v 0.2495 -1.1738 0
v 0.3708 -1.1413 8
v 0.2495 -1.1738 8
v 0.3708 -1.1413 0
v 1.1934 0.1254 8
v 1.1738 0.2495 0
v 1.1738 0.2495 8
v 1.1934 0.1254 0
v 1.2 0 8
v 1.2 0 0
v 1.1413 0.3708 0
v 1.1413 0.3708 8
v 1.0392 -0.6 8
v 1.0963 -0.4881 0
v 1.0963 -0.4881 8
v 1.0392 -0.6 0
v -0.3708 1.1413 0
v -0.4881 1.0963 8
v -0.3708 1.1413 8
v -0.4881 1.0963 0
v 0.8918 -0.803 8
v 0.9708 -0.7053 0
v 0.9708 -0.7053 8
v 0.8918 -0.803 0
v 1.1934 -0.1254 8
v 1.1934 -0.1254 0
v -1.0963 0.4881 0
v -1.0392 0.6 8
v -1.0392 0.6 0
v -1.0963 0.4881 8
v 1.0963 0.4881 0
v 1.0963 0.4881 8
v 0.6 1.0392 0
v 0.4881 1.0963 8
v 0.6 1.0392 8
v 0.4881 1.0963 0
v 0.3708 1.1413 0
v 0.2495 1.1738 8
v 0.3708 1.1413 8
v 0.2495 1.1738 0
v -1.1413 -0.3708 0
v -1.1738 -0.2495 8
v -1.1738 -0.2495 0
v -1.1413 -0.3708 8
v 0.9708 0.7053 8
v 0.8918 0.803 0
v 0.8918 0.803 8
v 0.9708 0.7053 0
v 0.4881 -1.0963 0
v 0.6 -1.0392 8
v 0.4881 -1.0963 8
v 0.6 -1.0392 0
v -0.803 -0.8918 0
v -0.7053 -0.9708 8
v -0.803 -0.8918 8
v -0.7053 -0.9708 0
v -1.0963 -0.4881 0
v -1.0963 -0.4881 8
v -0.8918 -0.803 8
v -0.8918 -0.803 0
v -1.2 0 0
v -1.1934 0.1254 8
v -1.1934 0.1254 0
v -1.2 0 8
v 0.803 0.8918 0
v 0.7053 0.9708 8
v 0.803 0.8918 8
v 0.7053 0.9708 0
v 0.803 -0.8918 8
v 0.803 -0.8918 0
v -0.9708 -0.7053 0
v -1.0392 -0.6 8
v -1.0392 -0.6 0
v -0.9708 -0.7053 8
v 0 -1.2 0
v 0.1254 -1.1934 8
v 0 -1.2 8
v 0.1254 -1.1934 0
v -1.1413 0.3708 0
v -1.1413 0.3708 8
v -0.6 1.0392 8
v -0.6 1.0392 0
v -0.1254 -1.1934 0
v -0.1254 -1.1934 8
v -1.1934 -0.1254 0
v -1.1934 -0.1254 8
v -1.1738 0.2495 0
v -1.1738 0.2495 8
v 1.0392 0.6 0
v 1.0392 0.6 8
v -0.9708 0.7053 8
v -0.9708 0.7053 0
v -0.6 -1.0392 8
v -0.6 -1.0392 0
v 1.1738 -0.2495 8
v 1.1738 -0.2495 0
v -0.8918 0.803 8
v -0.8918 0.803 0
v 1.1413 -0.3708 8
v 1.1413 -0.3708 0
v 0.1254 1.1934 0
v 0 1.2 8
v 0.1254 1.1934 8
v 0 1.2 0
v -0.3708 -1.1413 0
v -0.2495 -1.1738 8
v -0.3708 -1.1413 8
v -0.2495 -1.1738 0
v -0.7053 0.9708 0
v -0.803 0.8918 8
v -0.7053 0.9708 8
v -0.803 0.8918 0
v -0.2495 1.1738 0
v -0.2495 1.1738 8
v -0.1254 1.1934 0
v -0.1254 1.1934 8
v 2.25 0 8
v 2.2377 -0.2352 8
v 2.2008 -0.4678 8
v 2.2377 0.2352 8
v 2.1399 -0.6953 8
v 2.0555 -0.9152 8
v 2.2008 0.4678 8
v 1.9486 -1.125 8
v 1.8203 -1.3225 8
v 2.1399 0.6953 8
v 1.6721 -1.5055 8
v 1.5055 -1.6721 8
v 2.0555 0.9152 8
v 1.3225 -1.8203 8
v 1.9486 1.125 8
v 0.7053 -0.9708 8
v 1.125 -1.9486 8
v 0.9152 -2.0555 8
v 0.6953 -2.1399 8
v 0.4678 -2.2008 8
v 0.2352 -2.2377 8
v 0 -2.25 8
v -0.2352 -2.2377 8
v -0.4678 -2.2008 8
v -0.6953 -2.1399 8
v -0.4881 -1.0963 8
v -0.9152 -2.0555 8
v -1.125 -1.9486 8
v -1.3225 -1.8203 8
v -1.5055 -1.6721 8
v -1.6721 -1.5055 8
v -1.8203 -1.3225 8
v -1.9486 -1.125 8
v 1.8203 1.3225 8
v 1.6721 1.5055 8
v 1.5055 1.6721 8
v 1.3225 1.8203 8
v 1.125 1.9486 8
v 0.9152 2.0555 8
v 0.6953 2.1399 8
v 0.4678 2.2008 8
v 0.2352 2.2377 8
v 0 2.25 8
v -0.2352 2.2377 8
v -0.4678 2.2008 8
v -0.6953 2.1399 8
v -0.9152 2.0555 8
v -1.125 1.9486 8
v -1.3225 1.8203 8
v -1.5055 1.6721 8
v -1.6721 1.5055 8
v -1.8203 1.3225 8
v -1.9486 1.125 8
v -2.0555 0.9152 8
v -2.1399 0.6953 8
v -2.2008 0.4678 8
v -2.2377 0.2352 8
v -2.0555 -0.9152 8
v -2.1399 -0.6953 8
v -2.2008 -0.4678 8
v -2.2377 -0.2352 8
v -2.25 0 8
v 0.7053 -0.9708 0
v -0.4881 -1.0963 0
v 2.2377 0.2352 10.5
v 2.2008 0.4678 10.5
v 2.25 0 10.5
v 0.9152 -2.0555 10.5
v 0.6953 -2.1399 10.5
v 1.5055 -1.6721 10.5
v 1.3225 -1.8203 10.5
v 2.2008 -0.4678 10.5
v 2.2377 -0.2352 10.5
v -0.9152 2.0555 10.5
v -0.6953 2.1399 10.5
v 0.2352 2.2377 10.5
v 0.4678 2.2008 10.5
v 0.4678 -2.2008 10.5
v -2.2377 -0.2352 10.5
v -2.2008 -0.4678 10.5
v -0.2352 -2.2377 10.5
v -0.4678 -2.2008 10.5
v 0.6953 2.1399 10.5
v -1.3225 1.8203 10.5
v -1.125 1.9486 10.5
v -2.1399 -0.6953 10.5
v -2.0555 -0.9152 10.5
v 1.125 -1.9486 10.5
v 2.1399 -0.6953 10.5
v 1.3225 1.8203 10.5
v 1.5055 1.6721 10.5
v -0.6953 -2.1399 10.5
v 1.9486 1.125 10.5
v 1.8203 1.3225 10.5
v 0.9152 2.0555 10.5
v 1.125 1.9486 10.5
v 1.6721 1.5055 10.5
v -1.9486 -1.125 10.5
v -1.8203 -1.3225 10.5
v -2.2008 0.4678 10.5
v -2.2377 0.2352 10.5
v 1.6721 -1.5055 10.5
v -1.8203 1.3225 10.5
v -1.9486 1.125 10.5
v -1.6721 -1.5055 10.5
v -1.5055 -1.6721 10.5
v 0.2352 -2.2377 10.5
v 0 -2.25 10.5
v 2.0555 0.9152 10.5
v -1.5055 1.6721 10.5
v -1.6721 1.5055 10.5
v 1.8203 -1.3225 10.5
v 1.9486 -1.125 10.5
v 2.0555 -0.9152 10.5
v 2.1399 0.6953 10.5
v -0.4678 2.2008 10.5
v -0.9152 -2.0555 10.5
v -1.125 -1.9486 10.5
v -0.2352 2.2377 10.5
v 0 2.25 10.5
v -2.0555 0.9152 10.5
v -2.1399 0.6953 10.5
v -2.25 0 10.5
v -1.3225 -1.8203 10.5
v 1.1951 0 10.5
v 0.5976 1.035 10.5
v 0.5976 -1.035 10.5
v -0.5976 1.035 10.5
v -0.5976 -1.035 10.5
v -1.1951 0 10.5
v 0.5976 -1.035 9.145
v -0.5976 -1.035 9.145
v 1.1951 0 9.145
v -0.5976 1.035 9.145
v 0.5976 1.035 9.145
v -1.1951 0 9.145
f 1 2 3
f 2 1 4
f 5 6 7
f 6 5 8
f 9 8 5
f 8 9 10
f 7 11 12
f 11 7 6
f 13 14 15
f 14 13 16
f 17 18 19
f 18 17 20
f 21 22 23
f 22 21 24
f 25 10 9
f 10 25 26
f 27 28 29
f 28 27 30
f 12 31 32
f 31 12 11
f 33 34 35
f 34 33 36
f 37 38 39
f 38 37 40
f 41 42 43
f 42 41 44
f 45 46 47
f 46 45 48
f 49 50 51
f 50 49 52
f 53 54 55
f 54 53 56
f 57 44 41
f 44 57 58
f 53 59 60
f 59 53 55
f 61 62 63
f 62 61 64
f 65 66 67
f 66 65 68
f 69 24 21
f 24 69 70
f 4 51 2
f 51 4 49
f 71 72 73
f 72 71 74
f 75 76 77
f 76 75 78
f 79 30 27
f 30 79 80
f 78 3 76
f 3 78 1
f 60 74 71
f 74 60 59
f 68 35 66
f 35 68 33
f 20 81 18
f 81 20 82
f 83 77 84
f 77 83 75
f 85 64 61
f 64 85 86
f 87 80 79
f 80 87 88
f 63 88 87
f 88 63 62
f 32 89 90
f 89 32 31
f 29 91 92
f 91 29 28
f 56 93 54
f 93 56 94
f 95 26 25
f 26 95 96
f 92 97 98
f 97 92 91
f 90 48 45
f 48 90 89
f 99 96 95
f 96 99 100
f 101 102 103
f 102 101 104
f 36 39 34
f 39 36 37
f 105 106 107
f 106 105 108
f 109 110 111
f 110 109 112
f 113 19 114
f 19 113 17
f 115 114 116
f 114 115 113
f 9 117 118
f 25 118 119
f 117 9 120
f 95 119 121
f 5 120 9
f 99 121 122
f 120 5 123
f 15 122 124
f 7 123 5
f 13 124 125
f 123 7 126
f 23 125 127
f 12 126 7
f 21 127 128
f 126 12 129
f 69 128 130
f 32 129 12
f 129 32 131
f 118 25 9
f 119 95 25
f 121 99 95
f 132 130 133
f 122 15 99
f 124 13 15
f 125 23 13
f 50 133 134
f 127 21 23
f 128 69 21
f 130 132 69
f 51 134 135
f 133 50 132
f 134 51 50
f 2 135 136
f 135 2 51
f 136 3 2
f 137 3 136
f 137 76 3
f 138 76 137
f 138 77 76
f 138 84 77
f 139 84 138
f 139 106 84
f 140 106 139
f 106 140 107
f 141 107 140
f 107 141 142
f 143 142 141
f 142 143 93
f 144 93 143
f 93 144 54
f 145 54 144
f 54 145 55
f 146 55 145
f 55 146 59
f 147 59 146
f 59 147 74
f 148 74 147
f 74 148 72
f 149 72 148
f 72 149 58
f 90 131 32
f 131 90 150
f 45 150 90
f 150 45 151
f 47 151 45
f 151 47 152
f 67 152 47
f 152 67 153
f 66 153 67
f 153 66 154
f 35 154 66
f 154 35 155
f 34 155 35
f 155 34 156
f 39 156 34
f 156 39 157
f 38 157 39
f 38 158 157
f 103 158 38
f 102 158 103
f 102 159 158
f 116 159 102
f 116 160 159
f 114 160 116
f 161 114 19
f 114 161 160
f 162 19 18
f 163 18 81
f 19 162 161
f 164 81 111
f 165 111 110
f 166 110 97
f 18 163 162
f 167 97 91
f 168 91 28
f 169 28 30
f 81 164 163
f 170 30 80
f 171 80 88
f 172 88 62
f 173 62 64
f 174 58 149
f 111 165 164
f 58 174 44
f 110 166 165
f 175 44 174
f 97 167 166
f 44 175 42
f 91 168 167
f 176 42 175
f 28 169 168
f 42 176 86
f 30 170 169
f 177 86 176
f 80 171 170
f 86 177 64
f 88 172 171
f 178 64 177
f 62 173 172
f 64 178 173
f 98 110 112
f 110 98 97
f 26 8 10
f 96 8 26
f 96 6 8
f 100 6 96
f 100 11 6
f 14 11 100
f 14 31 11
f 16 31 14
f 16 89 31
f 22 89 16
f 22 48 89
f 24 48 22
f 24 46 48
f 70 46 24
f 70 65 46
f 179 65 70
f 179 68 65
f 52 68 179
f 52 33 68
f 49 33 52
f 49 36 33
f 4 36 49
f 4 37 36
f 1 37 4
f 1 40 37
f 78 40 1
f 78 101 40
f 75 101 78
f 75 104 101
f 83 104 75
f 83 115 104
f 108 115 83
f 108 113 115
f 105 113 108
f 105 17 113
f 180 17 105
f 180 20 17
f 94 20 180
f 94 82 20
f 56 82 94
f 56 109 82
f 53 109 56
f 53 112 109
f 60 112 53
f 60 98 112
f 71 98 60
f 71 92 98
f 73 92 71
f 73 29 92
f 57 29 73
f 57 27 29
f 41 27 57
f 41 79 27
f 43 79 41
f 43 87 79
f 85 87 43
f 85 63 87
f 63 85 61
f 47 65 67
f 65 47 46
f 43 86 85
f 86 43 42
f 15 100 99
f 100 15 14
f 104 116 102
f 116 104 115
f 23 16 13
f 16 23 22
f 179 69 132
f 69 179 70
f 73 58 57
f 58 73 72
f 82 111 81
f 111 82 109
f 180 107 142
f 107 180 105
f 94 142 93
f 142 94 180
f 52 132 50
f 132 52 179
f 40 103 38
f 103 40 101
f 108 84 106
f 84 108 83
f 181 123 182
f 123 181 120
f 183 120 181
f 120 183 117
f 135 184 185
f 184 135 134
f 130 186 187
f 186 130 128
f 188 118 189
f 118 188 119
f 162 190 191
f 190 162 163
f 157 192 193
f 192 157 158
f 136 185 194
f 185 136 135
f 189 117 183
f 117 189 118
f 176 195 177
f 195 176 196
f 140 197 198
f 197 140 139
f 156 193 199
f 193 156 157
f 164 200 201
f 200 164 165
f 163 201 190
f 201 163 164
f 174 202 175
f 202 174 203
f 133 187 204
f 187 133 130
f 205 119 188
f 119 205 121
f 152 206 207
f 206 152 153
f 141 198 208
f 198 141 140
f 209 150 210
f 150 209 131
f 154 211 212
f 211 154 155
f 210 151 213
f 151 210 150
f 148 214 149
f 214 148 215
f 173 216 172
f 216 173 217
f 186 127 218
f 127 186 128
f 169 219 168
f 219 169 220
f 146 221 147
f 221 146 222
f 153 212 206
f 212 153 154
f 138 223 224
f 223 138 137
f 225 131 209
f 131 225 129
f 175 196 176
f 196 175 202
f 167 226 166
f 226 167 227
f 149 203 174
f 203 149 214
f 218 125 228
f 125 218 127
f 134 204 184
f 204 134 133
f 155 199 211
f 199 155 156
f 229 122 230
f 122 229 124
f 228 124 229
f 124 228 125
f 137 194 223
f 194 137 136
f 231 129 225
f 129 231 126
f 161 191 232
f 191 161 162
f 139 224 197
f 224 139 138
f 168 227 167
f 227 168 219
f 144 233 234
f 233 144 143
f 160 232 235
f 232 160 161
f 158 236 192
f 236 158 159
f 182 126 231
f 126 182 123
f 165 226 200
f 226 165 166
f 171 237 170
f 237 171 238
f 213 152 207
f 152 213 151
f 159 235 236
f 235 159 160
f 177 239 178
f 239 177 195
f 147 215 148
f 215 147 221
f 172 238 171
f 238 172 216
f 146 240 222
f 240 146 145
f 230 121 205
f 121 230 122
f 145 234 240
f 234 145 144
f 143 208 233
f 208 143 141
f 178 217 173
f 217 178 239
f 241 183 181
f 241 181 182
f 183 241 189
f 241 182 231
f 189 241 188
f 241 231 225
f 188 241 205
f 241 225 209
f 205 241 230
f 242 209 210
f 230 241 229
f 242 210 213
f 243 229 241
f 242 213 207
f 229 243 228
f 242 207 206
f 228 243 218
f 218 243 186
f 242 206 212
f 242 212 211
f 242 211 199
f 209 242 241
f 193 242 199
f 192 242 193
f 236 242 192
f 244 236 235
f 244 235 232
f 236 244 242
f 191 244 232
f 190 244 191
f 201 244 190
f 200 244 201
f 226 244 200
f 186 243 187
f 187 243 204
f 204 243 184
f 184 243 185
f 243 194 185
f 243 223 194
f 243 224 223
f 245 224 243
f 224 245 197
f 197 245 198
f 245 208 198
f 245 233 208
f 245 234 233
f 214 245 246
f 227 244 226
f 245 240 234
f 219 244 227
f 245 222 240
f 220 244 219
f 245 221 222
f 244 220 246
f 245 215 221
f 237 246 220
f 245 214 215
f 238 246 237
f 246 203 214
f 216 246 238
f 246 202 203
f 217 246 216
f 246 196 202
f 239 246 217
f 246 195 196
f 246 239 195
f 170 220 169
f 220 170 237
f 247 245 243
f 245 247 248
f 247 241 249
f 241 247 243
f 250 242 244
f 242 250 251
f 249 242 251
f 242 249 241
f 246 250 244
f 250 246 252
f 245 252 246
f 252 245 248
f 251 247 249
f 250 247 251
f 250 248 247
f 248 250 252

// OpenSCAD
// Socket-head cap screw, smooth printable representation.
$fn = 60;
eps = 0.02;
shaft_d = 2.4;
head_d = 4.5;
head_h = 2.5;
shaft_l = 8;
socket_flat = head_d * 0.46;
socket_depth = head_h * 0.55;
difference() {
    union() {
        cylinder(d = shaft_d, h = shaft_l);
        translate([0, 0, shaft_l]) cylinder(d = head_d, h = head_h);
    }
    translate([0, 0, shaft_l + head_h - socket_depth + eps])
        cylinder(d = socket_flat / cos(30), h = socket_depth + eps, $fn = 6);
}
